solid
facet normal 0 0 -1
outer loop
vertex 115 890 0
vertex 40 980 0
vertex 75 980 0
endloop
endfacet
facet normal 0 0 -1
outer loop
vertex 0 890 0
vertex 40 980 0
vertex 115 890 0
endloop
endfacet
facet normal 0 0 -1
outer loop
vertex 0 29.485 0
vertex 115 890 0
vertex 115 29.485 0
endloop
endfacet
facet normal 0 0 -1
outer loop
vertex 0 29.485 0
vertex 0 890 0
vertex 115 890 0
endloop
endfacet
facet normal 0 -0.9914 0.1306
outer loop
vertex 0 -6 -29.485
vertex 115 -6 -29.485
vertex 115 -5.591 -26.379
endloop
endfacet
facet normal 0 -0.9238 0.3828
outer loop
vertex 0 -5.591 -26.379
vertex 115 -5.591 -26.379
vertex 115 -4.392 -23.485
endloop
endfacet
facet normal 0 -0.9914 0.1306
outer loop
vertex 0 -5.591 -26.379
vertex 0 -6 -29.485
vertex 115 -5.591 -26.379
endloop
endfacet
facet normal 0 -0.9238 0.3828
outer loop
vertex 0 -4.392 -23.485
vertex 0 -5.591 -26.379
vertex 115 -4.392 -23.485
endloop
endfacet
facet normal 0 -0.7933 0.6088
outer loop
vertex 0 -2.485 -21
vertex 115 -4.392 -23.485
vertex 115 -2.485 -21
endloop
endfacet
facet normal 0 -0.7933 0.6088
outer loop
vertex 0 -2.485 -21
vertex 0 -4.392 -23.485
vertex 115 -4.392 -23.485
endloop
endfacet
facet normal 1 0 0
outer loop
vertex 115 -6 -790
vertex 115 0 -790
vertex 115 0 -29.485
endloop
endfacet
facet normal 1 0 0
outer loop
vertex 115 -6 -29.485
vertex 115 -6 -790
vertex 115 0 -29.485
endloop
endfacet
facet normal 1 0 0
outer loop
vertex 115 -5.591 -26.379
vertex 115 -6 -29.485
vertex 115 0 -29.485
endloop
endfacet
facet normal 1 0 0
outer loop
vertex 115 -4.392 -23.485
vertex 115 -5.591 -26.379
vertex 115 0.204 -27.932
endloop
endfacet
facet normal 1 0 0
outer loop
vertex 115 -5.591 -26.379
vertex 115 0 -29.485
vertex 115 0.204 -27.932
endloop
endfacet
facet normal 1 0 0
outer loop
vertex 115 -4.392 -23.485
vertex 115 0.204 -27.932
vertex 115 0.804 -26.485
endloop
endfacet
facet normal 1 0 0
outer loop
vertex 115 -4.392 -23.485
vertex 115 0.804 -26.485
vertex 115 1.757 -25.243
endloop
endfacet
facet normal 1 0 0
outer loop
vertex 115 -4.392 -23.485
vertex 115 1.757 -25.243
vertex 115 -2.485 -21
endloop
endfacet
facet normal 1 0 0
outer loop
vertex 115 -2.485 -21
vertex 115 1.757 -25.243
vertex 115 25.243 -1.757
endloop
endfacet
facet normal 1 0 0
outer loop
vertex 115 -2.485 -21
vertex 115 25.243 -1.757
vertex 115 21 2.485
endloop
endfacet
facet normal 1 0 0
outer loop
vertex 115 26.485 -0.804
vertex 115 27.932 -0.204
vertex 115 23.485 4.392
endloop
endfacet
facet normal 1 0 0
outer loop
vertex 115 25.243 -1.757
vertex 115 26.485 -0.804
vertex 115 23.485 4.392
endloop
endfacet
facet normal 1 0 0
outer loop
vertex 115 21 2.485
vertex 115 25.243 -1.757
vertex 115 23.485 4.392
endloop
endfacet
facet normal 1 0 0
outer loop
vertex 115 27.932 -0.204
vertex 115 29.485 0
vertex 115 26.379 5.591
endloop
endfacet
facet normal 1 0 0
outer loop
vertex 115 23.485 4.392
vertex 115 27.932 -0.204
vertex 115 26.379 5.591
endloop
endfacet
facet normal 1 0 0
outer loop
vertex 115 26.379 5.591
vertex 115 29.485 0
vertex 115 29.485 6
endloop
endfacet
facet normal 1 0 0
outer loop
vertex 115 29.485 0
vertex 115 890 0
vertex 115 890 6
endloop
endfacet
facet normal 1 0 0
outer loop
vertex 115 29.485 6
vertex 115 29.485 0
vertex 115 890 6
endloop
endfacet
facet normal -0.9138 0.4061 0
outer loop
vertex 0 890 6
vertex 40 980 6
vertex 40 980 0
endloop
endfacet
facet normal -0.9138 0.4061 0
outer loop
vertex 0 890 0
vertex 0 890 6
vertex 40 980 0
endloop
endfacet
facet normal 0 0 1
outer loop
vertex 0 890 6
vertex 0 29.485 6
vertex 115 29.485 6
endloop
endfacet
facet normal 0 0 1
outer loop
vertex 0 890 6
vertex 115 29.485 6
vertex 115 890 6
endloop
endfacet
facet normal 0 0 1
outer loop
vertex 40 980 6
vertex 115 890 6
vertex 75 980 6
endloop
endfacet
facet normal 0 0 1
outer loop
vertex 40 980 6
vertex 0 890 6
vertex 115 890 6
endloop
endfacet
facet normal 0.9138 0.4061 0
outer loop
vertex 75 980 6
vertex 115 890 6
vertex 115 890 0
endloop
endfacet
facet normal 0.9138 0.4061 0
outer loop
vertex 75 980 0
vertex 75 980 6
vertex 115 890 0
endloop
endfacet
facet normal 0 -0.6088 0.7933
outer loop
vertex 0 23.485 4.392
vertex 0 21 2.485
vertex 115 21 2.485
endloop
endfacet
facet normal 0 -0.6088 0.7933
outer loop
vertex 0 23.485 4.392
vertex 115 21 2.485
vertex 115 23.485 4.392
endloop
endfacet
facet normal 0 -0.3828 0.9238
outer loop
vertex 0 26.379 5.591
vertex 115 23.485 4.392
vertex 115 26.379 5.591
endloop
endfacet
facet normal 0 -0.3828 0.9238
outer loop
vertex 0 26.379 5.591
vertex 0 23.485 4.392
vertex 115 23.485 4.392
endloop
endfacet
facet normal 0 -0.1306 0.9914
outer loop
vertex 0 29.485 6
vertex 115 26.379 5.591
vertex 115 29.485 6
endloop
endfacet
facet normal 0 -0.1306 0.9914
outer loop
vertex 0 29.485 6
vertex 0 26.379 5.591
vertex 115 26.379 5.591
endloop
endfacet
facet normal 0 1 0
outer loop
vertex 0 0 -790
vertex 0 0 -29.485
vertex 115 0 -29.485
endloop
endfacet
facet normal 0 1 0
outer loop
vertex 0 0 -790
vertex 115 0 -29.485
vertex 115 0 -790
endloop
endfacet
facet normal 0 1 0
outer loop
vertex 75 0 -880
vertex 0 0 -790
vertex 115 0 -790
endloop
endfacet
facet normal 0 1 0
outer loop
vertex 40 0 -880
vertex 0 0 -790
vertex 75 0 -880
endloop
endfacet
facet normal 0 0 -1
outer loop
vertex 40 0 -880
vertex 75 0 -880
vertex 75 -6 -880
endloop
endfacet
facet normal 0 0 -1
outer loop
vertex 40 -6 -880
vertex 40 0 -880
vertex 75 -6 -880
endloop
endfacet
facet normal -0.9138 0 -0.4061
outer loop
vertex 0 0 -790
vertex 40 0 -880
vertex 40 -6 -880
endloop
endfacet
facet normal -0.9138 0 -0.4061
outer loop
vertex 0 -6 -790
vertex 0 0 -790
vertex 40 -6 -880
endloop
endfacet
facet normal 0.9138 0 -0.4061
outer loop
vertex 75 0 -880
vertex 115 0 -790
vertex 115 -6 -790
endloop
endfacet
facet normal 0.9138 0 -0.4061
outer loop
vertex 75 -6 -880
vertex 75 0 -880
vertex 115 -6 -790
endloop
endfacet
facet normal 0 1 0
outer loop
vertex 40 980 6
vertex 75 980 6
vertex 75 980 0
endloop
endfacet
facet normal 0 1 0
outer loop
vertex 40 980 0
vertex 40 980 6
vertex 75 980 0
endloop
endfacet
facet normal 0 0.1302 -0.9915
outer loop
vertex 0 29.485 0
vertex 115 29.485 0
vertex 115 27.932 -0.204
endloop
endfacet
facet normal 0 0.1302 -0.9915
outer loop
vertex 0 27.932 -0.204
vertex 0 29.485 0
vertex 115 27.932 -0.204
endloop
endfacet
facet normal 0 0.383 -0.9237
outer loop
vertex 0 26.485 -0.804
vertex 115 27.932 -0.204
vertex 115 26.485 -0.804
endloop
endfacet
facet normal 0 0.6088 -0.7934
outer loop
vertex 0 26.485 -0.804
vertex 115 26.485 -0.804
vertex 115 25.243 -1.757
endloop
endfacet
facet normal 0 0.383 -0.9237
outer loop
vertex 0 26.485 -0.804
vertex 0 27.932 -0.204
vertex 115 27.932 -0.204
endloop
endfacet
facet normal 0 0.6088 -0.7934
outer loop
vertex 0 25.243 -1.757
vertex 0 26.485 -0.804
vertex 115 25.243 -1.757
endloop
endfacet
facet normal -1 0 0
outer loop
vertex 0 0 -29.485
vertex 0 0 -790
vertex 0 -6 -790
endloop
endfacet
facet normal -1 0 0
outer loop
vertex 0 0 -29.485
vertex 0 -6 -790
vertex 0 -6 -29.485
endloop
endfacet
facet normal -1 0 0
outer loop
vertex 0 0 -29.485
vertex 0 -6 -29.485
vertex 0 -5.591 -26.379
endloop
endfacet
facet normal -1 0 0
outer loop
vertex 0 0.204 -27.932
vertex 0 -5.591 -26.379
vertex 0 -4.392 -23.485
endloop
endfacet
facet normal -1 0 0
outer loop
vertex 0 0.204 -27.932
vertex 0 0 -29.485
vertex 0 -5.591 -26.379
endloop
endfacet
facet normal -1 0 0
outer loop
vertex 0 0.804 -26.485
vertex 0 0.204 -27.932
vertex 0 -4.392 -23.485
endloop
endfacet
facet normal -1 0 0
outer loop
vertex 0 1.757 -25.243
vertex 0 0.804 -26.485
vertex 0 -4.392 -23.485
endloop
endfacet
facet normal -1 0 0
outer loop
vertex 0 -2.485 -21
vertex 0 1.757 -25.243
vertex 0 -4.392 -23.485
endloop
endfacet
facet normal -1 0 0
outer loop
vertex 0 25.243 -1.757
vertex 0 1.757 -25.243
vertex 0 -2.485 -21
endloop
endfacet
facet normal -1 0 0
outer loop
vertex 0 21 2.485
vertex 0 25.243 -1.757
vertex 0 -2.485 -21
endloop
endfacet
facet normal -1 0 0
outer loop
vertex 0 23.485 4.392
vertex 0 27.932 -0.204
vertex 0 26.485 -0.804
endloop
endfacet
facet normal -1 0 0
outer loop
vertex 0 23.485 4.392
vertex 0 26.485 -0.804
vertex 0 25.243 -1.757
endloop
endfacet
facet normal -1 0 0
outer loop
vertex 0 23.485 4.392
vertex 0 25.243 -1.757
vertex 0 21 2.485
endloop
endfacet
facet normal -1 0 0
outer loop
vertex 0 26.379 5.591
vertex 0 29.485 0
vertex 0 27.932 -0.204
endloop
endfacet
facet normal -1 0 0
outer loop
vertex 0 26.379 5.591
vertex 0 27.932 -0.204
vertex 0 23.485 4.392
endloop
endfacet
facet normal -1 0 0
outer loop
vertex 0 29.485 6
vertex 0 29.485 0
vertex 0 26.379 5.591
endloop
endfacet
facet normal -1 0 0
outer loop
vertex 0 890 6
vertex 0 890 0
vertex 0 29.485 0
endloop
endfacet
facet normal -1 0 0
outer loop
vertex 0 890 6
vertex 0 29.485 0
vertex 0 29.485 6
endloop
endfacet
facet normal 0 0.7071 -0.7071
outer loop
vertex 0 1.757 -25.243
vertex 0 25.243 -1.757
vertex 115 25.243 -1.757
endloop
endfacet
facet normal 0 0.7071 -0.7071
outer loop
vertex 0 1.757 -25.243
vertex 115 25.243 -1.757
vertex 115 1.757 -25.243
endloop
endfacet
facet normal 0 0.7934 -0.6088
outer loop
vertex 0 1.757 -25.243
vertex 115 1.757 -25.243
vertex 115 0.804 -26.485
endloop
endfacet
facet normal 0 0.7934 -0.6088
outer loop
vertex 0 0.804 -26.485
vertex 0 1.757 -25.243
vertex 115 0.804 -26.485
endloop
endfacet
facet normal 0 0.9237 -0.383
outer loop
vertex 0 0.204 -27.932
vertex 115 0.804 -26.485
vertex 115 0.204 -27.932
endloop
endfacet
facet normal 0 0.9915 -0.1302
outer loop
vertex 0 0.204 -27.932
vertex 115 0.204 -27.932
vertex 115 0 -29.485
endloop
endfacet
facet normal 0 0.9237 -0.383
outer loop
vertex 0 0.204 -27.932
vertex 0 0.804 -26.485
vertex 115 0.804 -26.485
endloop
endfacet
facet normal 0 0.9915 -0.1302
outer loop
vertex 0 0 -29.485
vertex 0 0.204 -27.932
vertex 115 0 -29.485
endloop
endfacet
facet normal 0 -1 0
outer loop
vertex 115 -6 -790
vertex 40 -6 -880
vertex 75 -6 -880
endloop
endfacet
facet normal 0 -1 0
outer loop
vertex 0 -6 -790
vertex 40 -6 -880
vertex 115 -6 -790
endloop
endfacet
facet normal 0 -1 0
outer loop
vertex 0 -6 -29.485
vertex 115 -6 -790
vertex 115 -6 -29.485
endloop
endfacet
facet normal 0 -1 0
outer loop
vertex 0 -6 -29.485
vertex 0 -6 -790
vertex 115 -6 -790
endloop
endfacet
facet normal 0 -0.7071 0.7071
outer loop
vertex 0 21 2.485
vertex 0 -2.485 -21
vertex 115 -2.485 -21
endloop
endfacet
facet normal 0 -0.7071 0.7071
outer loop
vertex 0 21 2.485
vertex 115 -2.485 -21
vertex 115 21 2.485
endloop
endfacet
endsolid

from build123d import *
from OCP.BRepFilletAPI import BRepFilletAPI_MakeChamfer

# Parameters (mm, degrees)
SM_BASE_FLANGE_1_DEPTH = 115
CHAMFER_1_SIZE         = 90
CHAMFER_1_SIZE2        = 40
CHAMFER_2_SIZE         = 40
CHAMFER_2_SIZE2        = 90


# Sheet-metal steps are written as plain solids
with BuildPart() as part:
    # Sketch 1 → 基体-法兰1 (new body)
    with BuildSketch(Plane(origin=(0, 0, 0), x_dir=(0, 0, -1), z_dir=(1, 0, 0))):
        with BuildLine():
            Line((0, 980), (0, 29.485281374))
            ThreePointArc((0, 29.485281374), (0.456722805, 27.18918078), (1.757359313, 25.242640687))
            Line((1.757359313, 25.242640687), (25.242640687, 1.757359313))
            ThreePointArc((25.242640687, 1.757359313), (27.18918078, 0.456722805), (29.485281374, 0))
            Line((29.485281374, 0), (880, 0))
            Line((880, 0), (880, -6))
            Line((880, -6), (29.485281374, -6))
            ThreePointArc((29.485281374, -6), (24.893080186, -5.08655439), (21, -2.485281374))
            Line((21, -2.485281374), (-2.485281374, 21))
            ThreePointArc((-2.485281374, 21), (-5.08655439, 24.893080186), (-6, 29.485281374))
            Line((-6, 29.485281374), (-6, 980))
            Line((-6, 980), (0, 980))
        make_face()
    extrude(amount=SM_BASE_FLANGE_1_DEPTH)

    # 倒角1
    chamfer_1_edges = [part.edges().sort_by_distance(p)[0] for p in [
        (115, 980, 3),
        (115, -3, -880),
    ]]
    chamfer_1_side = [part.faces().sort_by_distance(p)[0] for p in [
        (115, 25.400361972, 3.861867822),
    ]]
    chamfer(chamfer_1_edges, length=CHAMFER_1_SIZE, length2=CHAMFER_1_SIZE2, reference=chamfer_1_side[0])

    # 倒角2: one chamfer whose edges measure the first distance from different faces: ONE call of the kernel's chamfer builder (chamfer() names one face for all edges)
    chamfer_2_edges_1 = [part.edges().sort_by_distance(p)[0] for p in [
        (0, 980, 3),
    ]]
    chamfer_2_side_1 = [part.faces().sort_by_distance(p)[0] for p in [
        (37.5, 980, 3),
    ]]
    chamfer_2_edges_2 = [part.edges().sort_by_distance(p)[0] for p in [
        (0, -3, -880),
    ]]
    chamfer_2_side_2 = [part.faces().sort_by_distance(p)[0] for p in [
        (37.5, -3, -880),
    ]]
    chamfer_2 = BRepFilletAPI_MakeChamfer(part.part.solid().wrapped)
    for e in chamfer_2_edges_1:
        chamfer_2.Add(CHAMFER_2_SIZE, CHAMFER_2_SIZE2, e.wrapped, chamfer_2_side_1[0].wrapped)  # the first distance lies on this face
    for e in chamfer_2_edges_2:
        chamfer_2.Add(CHAMFER_2_SIZE, CHAMFER_2_SIZE2, e.wrapped, chamfer_2_side_2[0].wrapped)  # the first distance lies on this face
    add(Compound.cast(chamfer_2.Shape()), mode=Mode.REPLACE)


solid = part.part
